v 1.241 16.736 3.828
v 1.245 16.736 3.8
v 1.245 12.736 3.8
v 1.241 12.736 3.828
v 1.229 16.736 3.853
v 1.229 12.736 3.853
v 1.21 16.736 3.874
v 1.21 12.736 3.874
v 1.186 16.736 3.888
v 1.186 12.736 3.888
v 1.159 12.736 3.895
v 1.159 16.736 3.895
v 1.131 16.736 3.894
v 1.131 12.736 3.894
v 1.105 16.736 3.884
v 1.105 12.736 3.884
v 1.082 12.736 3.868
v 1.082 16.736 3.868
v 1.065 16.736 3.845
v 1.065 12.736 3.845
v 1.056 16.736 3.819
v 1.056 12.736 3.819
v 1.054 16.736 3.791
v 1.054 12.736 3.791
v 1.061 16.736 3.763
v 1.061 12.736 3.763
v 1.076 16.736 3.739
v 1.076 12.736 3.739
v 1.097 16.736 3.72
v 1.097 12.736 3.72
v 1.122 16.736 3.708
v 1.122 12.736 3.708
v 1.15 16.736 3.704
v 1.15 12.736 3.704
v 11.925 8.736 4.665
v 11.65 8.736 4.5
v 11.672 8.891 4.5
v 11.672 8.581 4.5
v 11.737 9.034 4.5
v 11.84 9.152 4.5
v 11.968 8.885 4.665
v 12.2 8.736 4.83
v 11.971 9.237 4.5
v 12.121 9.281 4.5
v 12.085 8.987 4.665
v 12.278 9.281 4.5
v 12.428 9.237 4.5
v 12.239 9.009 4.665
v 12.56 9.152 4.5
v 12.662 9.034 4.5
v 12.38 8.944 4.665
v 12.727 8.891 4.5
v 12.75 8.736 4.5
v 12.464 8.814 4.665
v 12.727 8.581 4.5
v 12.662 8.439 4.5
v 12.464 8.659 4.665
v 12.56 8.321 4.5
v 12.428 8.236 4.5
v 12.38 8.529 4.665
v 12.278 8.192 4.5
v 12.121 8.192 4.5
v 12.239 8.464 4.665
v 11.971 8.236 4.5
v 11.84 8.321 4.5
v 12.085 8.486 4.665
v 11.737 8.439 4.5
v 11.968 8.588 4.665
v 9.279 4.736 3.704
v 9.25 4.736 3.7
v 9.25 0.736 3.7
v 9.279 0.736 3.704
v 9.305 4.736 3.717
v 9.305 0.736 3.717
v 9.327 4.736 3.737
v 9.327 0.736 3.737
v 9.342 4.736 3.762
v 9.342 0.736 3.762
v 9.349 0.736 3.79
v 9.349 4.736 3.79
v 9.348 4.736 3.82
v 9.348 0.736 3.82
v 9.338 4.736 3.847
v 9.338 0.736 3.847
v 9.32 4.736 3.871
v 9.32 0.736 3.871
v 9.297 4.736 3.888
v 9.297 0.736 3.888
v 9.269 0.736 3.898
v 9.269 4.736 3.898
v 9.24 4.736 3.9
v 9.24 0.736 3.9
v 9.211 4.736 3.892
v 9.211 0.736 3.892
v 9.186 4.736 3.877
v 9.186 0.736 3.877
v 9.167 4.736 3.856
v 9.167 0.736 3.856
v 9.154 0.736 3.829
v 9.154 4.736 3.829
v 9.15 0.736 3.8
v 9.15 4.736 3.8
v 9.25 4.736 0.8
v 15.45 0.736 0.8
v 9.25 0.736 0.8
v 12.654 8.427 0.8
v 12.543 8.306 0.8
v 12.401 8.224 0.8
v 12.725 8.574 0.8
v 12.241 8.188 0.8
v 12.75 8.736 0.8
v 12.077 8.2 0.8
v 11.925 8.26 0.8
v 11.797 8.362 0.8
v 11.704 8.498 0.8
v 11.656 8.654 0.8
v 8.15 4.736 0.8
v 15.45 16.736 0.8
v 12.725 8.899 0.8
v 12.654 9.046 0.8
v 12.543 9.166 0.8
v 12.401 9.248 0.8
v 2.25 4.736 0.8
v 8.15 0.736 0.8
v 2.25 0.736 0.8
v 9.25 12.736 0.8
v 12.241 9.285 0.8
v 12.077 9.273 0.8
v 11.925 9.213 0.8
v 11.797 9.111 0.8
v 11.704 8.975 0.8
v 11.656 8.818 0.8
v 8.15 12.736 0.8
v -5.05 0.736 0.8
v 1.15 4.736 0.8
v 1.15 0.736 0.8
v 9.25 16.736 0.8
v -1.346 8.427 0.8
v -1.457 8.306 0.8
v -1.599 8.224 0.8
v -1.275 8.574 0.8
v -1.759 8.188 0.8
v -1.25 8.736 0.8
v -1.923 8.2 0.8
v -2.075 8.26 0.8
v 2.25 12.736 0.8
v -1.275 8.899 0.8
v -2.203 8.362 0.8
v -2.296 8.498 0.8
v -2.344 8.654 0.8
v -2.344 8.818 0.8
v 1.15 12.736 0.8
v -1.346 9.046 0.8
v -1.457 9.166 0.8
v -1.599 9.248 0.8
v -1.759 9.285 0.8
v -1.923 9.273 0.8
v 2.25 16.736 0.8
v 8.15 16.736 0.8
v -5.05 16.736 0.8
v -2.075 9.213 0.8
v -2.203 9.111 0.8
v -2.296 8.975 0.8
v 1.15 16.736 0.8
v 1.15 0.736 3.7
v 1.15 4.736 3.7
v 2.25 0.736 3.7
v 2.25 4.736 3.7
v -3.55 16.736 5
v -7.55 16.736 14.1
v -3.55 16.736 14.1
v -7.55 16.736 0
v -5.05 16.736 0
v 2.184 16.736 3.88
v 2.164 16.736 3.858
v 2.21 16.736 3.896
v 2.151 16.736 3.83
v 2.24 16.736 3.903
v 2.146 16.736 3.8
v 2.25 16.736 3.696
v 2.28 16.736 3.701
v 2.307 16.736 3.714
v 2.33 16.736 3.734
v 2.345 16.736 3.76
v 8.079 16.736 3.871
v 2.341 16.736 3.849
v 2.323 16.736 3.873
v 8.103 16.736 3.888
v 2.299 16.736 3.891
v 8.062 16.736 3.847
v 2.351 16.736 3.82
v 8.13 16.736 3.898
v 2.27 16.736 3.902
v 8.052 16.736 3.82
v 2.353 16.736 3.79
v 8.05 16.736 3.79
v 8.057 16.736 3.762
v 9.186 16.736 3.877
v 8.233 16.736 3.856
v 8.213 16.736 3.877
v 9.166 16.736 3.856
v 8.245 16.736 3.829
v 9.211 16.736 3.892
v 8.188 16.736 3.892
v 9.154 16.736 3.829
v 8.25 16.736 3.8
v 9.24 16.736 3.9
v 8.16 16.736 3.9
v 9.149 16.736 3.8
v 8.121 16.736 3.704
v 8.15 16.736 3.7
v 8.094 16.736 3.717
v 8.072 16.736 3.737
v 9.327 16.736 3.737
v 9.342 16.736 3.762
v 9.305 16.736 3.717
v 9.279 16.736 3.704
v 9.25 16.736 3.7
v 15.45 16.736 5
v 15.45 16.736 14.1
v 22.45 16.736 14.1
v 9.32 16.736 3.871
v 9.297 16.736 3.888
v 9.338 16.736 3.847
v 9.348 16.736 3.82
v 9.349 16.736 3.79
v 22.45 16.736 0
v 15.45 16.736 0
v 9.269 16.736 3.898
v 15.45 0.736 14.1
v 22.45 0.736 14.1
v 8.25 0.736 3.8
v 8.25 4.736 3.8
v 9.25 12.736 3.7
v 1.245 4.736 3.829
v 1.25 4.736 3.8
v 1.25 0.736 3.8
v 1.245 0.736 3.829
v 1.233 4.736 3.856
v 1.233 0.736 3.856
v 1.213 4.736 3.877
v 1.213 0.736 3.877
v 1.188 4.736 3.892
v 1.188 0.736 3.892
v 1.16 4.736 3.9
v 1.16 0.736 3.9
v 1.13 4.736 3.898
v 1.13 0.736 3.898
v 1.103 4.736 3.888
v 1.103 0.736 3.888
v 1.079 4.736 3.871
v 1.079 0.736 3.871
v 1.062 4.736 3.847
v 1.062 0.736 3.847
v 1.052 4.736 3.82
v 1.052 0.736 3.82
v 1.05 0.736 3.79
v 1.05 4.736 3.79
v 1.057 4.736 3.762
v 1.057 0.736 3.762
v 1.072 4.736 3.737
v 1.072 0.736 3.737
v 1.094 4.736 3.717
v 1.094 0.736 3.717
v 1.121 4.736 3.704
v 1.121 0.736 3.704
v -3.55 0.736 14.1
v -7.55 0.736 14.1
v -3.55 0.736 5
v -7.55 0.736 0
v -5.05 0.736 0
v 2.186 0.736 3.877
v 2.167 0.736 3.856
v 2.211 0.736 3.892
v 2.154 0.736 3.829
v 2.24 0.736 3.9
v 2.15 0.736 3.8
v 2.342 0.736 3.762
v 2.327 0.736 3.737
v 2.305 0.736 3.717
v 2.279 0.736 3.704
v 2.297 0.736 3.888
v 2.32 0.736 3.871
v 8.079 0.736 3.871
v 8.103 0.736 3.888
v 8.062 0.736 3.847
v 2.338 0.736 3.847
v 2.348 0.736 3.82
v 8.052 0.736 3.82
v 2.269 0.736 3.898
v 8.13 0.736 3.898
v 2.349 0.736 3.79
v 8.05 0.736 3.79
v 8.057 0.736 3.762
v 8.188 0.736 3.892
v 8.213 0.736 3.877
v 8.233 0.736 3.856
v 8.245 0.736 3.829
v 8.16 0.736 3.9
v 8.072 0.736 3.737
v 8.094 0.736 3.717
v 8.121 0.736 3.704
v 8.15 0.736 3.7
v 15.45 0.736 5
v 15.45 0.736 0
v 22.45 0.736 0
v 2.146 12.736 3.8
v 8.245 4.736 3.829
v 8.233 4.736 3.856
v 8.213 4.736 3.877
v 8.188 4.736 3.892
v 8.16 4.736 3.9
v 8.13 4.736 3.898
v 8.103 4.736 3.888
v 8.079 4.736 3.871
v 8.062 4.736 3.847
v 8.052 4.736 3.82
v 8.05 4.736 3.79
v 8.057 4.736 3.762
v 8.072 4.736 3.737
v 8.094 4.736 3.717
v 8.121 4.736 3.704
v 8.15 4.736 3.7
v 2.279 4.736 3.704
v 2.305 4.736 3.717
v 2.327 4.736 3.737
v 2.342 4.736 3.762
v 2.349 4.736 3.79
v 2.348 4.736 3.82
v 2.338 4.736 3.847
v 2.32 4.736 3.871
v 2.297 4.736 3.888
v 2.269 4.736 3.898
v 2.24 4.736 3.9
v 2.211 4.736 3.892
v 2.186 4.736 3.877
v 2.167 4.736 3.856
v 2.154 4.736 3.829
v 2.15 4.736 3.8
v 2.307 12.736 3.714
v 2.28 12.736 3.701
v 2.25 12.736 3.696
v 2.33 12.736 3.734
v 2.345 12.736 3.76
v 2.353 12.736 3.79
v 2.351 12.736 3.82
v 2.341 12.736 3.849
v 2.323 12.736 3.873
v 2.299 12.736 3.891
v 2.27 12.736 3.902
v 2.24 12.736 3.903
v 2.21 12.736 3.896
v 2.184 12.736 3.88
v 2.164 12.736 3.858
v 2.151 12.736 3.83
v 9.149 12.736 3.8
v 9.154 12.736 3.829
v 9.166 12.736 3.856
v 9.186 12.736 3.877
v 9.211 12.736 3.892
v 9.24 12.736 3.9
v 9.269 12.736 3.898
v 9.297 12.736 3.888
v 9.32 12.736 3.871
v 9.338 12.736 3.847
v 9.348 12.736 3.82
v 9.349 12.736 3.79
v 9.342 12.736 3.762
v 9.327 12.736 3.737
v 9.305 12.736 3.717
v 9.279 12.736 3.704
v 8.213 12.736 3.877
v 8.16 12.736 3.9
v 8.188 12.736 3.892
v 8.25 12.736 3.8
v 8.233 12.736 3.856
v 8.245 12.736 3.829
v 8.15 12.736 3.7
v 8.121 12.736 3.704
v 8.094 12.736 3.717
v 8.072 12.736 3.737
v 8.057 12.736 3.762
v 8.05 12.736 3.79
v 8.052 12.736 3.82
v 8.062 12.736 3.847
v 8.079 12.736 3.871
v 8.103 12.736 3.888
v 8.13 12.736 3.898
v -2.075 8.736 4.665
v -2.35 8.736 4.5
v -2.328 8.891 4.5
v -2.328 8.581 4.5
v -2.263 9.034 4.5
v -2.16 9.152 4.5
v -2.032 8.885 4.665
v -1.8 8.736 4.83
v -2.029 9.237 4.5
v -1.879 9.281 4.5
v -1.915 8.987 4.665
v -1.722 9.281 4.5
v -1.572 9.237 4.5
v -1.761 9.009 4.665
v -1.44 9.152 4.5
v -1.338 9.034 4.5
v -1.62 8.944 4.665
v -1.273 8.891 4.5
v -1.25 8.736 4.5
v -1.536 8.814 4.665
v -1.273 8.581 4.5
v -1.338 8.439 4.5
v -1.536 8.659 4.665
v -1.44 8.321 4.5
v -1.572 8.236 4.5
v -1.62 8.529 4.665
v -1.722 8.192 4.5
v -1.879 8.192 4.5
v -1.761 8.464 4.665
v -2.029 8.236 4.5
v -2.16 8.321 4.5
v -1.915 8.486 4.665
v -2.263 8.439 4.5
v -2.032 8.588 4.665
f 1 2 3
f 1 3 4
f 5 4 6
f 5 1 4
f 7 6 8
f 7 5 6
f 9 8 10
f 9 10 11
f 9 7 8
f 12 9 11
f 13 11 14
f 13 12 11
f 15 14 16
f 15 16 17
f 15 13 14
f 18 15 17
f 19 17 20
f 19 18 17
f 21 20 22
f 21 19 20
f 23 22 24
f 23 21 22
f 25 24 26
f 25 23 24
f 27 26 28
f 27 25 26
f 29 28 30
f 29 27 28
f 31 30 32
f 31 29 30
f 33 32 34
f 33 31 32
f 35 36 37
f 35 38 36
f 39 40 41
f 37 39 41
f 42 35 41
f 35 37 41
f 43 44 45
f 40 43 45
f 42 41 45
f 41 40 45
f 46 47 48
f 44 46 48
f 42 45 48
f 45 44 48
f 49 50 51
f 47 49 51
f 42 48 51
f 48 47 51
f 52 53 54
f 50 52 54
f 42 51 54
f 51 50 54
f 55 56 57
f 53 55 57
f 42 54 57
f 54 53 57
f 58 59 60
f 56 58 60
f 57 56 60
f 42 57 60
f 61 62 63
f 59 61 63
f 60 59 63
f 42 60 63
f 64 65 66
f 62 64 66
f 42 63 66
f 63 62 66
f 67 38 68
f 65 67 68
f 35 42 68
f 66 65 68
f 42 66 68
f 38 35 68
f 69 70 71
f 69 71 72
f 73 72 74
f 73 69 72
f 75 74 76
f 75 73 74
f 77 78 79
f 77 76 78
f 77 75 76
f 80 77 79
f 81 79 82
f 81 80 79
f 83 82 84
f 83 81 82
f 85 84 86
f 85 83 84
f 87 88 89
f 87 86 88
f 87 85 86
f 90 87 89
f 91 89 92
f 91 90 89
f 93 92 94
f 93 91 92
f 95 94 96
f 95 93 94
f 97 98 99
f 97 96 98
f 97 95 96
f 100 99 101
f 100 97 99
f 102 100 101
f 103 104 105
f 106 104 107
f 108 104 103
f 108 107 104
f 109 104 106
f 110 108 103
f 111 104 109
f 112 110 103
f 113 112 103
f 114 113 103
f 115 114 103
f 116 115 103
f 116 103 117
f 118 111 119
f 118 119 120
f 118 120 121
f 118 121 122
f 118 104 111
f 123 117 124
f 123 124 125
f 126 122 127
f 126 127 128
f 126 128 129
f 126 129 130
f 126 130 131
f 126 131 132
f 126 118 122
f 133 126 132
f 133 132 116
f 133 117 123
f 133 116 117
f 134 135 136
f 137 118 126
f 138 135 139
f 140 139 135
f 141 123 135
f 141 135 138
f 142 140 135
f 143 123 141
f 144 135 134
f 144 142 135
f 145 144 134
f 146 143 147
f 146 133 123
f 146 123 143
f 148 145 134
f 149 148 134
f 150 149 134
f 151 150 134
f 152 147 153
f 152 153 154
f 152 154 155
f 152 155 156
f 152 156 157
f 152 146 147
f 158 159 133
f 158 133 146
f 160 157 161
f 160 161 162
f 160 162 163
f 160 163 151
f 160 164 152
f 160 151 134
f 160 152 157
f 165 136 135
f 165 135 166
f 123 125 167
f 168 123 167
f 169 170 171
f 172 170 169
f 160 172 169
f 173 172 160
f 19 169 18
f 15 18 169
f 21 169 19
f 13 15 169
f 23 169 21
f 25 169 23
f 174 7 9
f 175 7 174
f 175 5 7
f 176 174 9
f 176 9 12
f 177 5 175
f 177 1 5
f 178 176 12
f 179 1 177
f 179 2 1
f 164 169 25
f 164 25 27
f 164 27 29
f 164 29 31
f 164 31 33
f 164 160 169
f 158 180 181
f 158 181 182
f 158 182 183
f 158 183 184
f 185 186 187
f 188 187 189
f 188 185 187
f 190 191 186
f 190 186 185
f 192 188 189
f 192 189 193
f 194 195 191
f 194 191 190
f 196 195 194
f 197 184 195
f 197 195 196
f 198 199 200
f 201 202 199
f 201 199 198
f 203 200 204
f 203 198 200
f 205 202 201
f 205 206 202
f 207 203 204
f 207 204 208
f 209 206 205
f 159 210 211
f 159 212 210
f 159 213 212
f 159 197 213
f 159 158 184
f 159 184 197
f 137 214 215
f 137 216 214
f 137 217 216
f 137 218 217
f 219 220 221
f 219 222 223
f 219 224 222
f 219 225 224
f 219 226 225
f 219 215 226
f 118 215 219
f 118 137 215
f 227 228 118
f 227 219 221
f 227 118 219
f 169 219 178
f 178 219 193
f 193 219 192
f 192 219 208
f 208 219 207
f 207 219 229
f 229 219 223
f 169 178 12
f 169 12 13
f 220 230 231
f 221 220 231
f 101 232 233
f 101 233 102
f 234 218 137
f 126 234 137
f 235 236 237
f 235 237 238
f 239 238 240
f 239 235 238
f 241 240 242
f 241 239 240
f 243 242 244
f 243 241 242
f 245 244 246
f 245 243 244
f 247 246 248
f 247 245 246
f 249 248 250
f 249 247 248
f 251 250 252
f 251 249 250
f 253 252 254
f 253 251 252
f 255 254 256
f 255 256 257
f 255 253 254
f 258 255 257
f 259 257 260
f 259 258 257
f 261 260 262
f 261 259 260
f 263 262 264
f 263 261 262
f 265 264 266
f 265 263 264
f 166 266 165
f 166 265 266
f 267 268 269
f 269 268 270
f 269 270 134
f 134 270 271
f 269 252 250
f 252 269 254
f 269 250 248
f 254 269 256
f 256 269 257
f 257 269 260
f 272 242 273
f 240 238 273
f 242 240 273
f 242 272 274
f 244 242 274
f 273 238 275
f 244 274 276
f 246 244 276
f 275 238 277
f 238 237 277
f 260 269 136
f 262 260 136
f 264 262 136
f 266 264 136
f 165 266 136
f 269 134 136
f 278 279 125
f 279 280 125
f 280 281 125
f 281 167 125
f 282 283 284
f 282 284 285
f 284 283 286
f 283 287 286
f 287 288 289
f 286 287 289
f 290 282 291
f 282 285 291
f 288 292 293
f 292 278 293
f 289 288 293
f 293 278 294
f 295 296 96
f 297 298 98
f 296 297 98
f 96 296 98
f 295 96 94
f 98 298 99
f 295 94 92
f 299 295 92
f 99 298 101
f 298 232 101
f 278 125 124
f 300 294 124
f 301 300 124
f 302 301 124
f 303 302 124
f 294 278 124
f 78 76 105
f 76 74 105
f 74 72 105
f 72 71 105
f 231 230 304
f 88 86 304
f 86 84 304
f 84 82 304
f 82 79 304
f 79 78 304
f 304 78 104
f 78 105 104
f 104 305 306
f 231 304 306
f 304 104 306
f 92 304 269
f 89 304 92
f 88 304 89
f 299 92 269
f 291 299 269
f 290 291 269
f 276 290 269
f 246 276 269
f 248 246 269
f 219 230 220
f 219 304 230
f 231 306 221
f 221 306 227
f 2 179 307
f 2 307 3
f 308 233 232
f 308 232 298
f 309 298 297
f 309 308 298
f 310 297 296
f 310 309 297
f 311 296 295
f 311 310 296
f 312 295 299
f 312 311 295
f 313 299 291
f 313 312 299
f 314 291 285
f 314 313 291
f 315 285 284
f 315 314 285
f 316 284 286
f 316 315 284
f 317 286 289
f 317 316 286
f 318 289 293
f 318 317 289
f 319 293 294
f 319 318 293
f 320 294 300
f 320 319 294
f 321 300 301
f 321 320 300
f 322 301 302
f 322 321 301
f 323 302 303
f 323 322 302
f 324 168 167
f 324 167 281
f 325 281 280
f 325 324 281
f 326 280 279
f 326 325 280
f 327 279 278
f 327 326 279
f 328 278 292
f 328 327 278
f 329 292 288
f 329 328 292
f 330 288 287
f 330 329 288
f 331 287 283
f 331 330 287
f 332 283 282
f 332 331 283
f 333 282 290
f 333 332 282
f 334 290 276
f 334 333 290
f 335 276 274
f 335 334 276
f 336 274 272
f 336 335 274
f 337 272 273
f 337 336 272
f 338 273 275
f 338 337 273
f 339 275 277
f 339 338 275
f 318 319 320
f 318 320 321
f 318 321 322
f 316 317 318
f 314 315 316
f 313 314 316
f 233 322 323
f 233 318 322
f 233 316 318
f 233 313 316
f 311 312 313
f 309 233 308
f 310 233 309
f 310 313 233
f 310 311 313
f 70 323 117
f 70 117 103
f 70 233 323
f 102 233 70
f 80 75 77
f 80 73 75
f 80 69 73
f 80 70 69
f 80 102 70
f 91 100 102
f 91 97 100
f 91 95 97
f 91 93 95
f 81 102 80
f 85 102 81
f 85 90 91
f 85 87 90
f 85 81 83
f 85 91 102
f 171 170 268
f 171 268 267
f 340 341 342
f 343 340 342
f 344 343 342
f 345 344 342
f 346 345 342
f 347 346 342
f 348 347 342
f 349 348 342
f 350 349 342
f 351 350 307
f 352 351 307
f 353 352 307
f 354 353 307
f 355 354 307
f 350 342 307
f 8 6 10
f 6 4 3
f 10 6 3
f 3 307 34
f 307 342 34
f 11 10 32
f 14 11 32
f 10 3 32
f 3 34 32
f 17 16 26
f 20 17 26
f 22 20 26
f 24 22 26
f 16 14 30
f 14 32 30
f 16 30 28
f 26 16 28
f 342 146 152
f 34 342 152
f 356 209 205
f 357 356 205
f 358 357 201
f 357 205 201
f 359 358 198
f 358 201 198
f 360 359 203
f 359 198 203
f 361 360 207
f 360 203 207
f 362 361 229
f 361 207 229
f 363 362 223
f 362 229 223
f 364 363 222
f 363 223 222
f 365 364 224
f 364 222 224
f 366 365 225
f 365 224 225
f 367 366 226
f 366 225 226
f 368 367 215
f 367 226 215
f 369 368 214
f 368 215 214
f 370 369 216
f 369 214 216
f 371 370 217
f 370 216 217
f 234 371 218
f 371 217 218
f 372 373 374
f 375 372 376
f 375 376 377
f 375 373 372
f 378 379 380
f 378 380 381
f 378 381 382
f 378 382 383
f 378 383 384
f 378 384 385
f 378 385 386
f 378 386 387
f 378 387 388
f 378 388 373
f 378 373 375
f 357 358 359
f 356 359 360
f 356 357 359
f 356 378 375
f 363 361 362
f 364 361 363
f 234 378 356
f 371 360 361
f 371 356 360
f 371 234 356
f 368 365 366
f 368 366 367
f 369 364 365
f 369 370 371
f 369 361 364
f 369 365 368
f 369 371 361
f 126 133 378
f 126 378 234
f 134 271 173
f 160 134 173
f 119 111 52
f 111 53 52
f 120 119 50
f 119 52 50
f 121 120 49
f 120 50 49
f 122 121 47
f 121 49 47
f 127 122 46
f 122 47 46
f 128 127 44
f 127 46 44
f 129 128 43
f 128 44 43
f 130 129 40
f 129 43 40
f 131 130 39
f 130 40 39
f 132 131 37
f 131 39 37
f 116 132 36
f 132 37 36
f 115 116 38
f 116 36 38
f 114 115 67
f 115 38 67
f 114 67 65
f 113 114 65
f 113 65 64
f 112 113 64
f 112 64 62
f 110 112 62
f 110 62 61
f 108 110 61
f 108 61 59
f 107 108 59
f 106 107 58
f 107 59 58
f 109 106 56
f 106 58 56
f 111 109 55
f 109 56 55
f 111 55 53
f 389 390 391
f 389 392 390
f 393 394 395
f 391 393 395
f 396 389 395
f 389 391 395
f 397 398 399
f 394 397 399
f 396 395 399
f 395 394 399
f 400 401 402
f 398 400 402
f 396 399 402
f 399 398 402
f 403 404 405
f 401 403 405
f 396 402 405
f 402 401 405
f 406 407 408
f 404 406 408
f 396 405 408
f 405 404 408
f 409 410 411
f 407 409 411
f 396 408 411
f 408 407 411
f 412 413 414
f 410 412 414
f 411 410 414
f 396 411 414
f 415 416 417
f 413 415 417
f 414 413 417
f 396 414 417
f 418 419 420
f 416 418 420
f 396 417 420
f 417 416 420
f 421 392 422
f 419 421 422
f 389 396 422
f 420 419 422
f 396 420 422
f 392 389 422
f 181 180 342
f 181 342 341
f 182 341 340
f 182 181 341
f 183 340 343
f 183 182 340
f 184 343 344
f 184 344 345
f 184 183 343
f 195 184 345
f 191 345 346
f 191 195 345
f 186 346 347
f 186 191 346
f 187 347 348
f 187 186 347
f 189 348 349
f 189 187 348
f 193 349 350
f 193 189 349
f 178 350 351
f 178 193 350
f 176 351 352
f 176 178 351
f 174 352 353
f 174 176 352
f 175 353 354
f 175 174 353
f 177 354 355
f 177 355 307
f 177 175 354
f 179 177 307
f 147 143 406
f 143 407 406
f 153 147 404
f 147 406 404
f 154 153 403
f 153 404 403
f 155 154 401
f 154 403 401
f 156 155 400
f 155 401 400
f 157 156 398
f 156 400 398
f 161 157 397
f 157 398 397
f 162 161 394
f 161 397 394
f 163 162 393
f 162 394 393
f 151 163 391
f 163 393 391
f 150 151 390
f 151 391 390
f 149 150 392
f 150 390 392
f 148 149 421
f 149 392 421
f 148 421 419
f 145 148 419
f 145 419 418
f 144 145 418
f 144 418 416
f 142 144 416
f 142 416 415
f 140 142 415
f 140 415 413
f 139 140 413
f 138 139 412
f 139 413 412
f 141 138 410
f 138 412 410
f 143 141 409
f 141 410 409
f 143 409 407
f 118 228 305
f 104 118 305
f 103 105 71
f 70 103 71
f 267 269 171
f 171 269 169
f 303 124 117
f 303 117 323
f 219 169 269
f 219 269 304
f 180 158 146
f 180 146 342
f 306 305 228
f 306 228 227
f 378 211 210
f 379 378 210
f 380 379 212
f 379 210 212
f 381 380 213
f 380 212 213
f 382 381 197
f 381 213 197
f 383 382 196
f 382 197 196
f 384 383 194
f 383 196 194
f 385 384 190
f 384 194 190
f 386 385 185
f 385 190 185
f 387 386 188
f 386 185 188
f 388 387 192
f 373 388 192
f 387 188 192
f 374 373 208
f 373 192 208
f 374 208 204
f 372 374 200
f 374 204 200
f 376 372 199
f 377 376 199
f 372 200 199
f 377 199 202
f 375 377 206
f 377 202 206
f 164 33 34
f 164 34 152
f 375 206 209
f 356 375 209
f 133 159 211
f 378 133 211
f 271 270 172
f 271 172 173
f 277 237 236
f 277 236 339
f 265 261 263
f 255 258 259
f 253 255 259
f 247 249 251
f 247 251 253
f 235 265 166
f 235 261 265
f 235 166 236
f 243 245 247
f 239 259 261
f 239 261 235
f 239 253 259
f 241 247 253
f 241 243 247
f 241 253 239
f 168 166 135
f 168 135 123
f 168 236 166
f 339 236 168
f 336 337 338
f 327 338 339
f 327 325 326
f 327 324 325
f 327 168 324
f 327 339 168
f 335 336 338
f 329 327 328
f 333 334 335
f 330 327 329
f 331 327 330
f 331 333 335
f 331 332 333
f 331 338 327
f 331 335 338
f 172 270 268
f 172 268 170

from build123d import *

# Parameters (mm, degrees)
SKETCH_1_W           = 30
SKETCH_1_H           = 28
EXTRUDE_1_DEPTH      = 10
CUT_EXTRUDE_2_DEPTH  = 0.8
M1_4X0_3_2_D         = 1.1
M1_4X0_3_2_DEPTH     = 3.7
M1_4X0_3_2_TIP       = 0.33047334
CUT_EXTRUDE_3_DEPTH  = 4
CUT_EXTRUDE_4_DEPTH  = 0.5
SKETCH_12_W          = 30
SKETCH_12_H          = 4.25
CUT_EXTRUDE_5_DEPTH  = 10
SKETCH_14_W          = 23
SKETCH_14_H          = 23.75
CUT_EXTRUDE_7_DEPTH  = 5
SKETCH_23_W          = 4
SKETCH_23_H          = 23.75
EXTRUDE_4_DEPTH      = 9.1
SKETCH_24_W          = 30
SKETCH_24_H          = 7.75
CUT_EXTRUDE_8_DEPTH  = 20
SKETCH_25_W          = 7
SKETCH_25_H          = 16
EXTRUDE_5_DEPTH      = 4.1
SKETCH_26_W          = 3
SKETCH_26_H          = 0.8
CUT_EXTRUDE_9_DEPTH  = 4.1
SKETCH_28_W          = 1.1
SKETCH_28_H          = 3
CUT_EXTRUDE_11_DEPTH = 4
CUT_EXTRUDE_START    = -4
SKETCH_29_R          = 0.1
CUT_EXTRUDE_12_DEPTH = 4


with BuildPart() as part:
    # 草图1 → 凸台-拉伸1 (new body)
    with BuildSketch(Plane.XY):
        with Locations((7.449728974, 2.736434109)):
            Rectangle(SKETCH_1_W, SKETCH_1_H)
    extrude(amount=EXTRUDE_1_DEPTH)

    # 草图2 → 切除-拉伸2 (cut)
    with BuildSketch(Plane(origin=(0, 0, 0), x_dir=(-1, 0, 0), z_dir=(0, 0, -1))):
        with BuildLine():
            Line((5.050271026, 16.736434109), (-15.449728974, 16.736434109))
            Line((-15.449728974, 16.736434109), (-15.449728974, 3.736434109))
            ThreePointArc((-15.449728974, 3.736434109), (-14.571049317, 1.615113765), (-12.449728974, 0.736434109))
            Line((-12.449728974, 0.736434109), (2.050271026, 0.736434109))
            ThreePointArc((2.050271026, 0.736434109), (4.17159137, 1.615113765), (5.050271026, 3.736434109))
            Line((5.050271026, 3.736434109), (5.050271026, 16.736434109))
        make_face()
    extrude(amount=-CUT_EXTRUDE_2_DEPTH, mode=Mode.SUBTRACT)

    # M1.4x0.3 螺纹孔2
    with Locations(Plane(origin=(0, 0, 0.8), x_dir=(-1, 0, 0), z_dir=(0, 0, -1))):
        with Locations((-12.199728974, 8.736434109), (1.800271026, 8.736434109)):
            Hole(M1_4X0_3_2_D / 2, depth=M1_4X0_3_2_DEPTH)
            with Locations((0, 0, -(M1_4X0_3_2_DEPTH + M1_4X0_3_2_TIP / 2))):  # 118° drill point
                Cone(0, M1_4X0_3_2_D / 2, M1_4X0_3_2_TIP, mode=Mode.SUBTRACT)

    # 草图10 → 切除-拉伸3 (cut)
    with BuildSketch(Plane(origin=(0, 16.736434109, 0), x_dir=(1, 0, 0), z_dir=(0, 1, 0))):
        with BuildLine():
            Line((9.249728974, -0.8), (8.149728974, -0.8))
            Line((8.149728974, -0.8), (8.149728974, -3.7))
            ThreePointArc((8.149728974, -3.7), (8.07901805, -3.870710433), (8.249728974, -3.800000693))
            Line((8.249728974, -3.800000693), (9.14947862, -3.800000693))
            ThreePointArc((9.14947862, -3.800000693), (9.320100726, -3.870799843), (9.249728974, -3.700001016))
            Line((9.249728974, -3.700001016), (9.249728974, -0.8))
        make_face()
        with BuildLine():
            Line((1.149728974, -0.8), (2.249728974, -0.8))
            Line((2.249728974, -0.8), (2.249728974, -3.696415438))
            ThreePointArc((2.249728974, -3.696415438), (2.32297432, -3.873245346), (2.146144411, -3.8))
            Line((2.146144411, -3.8), (1.245429293, -3.8))
            ThreePointArc((1.245429293, -3.8), (1.082058629, -3.867670345), (1.149728974, -3.704299681))
            Line((1.149728974, -3.704299681), (1.149728974, -0.8))
        make_face()
    extrude(amount=-CUT_EXTRUDE_3_DEPTH, mode=Mode.SUBTRACT)

    # 草图11 → 切除-拉伸4 (cut)
    with BuildSketch(Plane(origin=(0, 0, 0), x_dir=(-1, 0, 0), z_dir=(0, 0, -1))):
        with BuildLine():
            Line((-7.549728974, -2.063565891), (-2.849728974, -2.063565891))
            ThreePointArc((-2.849728974, -2.063565891), (-2.422952278, -2.240342587), (-2.599728974, -1.813565891))
            Line((-2.599728974, -1.813565891), (-2.599728974, 0.736434109))
            Line((-2.599728974, 0.736434109), (-7.799728974, 0.736434109))
            Line((-7.799728974, 0.736434109), (-7.799728974, -1.813565891))
            ThreePointArc((-7.799728974, -1.813565891), (-7.976505669, -2.240342587), (-7.549728974, -2.063565891))
        make_face()
    extrude(amount=-CUT_EXTRUDE_4_DEPTH, mode=Mode.SUBTRACT)

    # 草图12 → 切除-拉伸5 (cut)
    with BuildSketch(Plane(origin=(0, 0, 0), x_dir=(-1, 0, 0), z_dir=(0, 0, -1))):
        with Locations((-7.449728974, -9.138565891)):
            Rectangle(SKETCH_12_W, SKETCH_12_H)
    extrude(amount=-CUT_EXTRUDE_5_DEPTH, mode=Mode.SUBTRACT)

    # 草图14 → 切除-拉伸7 (cut)
    with BuildSketch(Plane.XY.offset(10)):
        with Locations((3.949728974, 4.861434109)):
            Rectangle(SKETCH_14_W, SKETCH_14_H)
    extrude(amount=-CUT_EXTRUDE_7_DEPTH, mode=Mode.SUBTRACT)

    # 草图23 → 凸台-拉伸4 (add)
    with BuildSketch(Plane.XY.offset(5)):
        with Locations((-5.550271026, 4.861434109)):
            Rectangle(SKETCH_23_W, SKETCH_23_H)
    extrude(amount=EXTRUDE_4_DEPTH)

    # 草图24 → 切除-拉伸8 (cut)
    with BuildSketch(Plane(origin=(0, 0, 0), x_dir=(-1, 0, 0), z_dir=(0, 0, -1))):
        with Locations((-7.449728974, -3.138565891)):
            Rectangle(SKETCH_24_W, SKETCH_24_H)
    extrude(amount=-CUT_EXTRUDE_8_DEPTH, mode=Mode.SUBTRACT)

    # 草图25 → 凸台-拉伸5 (add)
    with BuildSketch(Plane.XY.offset(10)):
        with Locations((18.949728974, 8.736434109)):
            Rectangle(SKETCH_25_W, SKETCH_25_H)
    extrude(amount=EXTRUDE_5_DEPTH)

    # 草图26 → 切除-拉伸9 (cut)
    with BuildSketch(Plane.XZ.offset(-0.736434109)):
        with Locations((13.949728974, 0.4)):
            Rectangle(SKETCH_26_W, SKETCH_26_H)
        with Locations((-3.550271026, 0.4)):
            Rectangle(SKETCH_26_W, SKETCH_26_H)
    extrude(amount=-CUT_EXTRUDE_9_DEPTH, mode=Mode.SUBTRACT)

    # 草图28 → 切除-拉伸11 (cut)
    with BuildSketch(Plane.XZ.offset(-0.736434109)):
        with Locations((8.699728974, 2.3)):
            Rectangle(SKETCH_28_W, SKETCH_28_H)
        with Locations((1.699728974, 2.3)):
            Rectangle(SKETCH_28_W, SKETCH_28_H)
    extrude(amount=-CUT_EXTRUDE_11_DEPTH, mode=Mode.SUBTRACT)

    # 草图29 → 切除-拉伸12 (cut)
    with BuildSketch(Plane.XZ.offset(-0.736434109).offset(CUT_EXTRUDE_START)):
        with Locations((9.249728974, 3.8)):
            Circle(SKETCH_29_R)
        with Locations((8.149728974, 3.8)):
            Circle(SKETCH_29_R)
        with Locations((2.249728974, 3.8)):
            Circle(SKETCH_29_R)
        with Locations((1.149728974, 3.8)):
            Circle(SKETCH_29_R)
    extrude(amount=CUT_EXTRUDE_12_DEPTH, mode=Mode.SUBTRACT)


solid = part.part
